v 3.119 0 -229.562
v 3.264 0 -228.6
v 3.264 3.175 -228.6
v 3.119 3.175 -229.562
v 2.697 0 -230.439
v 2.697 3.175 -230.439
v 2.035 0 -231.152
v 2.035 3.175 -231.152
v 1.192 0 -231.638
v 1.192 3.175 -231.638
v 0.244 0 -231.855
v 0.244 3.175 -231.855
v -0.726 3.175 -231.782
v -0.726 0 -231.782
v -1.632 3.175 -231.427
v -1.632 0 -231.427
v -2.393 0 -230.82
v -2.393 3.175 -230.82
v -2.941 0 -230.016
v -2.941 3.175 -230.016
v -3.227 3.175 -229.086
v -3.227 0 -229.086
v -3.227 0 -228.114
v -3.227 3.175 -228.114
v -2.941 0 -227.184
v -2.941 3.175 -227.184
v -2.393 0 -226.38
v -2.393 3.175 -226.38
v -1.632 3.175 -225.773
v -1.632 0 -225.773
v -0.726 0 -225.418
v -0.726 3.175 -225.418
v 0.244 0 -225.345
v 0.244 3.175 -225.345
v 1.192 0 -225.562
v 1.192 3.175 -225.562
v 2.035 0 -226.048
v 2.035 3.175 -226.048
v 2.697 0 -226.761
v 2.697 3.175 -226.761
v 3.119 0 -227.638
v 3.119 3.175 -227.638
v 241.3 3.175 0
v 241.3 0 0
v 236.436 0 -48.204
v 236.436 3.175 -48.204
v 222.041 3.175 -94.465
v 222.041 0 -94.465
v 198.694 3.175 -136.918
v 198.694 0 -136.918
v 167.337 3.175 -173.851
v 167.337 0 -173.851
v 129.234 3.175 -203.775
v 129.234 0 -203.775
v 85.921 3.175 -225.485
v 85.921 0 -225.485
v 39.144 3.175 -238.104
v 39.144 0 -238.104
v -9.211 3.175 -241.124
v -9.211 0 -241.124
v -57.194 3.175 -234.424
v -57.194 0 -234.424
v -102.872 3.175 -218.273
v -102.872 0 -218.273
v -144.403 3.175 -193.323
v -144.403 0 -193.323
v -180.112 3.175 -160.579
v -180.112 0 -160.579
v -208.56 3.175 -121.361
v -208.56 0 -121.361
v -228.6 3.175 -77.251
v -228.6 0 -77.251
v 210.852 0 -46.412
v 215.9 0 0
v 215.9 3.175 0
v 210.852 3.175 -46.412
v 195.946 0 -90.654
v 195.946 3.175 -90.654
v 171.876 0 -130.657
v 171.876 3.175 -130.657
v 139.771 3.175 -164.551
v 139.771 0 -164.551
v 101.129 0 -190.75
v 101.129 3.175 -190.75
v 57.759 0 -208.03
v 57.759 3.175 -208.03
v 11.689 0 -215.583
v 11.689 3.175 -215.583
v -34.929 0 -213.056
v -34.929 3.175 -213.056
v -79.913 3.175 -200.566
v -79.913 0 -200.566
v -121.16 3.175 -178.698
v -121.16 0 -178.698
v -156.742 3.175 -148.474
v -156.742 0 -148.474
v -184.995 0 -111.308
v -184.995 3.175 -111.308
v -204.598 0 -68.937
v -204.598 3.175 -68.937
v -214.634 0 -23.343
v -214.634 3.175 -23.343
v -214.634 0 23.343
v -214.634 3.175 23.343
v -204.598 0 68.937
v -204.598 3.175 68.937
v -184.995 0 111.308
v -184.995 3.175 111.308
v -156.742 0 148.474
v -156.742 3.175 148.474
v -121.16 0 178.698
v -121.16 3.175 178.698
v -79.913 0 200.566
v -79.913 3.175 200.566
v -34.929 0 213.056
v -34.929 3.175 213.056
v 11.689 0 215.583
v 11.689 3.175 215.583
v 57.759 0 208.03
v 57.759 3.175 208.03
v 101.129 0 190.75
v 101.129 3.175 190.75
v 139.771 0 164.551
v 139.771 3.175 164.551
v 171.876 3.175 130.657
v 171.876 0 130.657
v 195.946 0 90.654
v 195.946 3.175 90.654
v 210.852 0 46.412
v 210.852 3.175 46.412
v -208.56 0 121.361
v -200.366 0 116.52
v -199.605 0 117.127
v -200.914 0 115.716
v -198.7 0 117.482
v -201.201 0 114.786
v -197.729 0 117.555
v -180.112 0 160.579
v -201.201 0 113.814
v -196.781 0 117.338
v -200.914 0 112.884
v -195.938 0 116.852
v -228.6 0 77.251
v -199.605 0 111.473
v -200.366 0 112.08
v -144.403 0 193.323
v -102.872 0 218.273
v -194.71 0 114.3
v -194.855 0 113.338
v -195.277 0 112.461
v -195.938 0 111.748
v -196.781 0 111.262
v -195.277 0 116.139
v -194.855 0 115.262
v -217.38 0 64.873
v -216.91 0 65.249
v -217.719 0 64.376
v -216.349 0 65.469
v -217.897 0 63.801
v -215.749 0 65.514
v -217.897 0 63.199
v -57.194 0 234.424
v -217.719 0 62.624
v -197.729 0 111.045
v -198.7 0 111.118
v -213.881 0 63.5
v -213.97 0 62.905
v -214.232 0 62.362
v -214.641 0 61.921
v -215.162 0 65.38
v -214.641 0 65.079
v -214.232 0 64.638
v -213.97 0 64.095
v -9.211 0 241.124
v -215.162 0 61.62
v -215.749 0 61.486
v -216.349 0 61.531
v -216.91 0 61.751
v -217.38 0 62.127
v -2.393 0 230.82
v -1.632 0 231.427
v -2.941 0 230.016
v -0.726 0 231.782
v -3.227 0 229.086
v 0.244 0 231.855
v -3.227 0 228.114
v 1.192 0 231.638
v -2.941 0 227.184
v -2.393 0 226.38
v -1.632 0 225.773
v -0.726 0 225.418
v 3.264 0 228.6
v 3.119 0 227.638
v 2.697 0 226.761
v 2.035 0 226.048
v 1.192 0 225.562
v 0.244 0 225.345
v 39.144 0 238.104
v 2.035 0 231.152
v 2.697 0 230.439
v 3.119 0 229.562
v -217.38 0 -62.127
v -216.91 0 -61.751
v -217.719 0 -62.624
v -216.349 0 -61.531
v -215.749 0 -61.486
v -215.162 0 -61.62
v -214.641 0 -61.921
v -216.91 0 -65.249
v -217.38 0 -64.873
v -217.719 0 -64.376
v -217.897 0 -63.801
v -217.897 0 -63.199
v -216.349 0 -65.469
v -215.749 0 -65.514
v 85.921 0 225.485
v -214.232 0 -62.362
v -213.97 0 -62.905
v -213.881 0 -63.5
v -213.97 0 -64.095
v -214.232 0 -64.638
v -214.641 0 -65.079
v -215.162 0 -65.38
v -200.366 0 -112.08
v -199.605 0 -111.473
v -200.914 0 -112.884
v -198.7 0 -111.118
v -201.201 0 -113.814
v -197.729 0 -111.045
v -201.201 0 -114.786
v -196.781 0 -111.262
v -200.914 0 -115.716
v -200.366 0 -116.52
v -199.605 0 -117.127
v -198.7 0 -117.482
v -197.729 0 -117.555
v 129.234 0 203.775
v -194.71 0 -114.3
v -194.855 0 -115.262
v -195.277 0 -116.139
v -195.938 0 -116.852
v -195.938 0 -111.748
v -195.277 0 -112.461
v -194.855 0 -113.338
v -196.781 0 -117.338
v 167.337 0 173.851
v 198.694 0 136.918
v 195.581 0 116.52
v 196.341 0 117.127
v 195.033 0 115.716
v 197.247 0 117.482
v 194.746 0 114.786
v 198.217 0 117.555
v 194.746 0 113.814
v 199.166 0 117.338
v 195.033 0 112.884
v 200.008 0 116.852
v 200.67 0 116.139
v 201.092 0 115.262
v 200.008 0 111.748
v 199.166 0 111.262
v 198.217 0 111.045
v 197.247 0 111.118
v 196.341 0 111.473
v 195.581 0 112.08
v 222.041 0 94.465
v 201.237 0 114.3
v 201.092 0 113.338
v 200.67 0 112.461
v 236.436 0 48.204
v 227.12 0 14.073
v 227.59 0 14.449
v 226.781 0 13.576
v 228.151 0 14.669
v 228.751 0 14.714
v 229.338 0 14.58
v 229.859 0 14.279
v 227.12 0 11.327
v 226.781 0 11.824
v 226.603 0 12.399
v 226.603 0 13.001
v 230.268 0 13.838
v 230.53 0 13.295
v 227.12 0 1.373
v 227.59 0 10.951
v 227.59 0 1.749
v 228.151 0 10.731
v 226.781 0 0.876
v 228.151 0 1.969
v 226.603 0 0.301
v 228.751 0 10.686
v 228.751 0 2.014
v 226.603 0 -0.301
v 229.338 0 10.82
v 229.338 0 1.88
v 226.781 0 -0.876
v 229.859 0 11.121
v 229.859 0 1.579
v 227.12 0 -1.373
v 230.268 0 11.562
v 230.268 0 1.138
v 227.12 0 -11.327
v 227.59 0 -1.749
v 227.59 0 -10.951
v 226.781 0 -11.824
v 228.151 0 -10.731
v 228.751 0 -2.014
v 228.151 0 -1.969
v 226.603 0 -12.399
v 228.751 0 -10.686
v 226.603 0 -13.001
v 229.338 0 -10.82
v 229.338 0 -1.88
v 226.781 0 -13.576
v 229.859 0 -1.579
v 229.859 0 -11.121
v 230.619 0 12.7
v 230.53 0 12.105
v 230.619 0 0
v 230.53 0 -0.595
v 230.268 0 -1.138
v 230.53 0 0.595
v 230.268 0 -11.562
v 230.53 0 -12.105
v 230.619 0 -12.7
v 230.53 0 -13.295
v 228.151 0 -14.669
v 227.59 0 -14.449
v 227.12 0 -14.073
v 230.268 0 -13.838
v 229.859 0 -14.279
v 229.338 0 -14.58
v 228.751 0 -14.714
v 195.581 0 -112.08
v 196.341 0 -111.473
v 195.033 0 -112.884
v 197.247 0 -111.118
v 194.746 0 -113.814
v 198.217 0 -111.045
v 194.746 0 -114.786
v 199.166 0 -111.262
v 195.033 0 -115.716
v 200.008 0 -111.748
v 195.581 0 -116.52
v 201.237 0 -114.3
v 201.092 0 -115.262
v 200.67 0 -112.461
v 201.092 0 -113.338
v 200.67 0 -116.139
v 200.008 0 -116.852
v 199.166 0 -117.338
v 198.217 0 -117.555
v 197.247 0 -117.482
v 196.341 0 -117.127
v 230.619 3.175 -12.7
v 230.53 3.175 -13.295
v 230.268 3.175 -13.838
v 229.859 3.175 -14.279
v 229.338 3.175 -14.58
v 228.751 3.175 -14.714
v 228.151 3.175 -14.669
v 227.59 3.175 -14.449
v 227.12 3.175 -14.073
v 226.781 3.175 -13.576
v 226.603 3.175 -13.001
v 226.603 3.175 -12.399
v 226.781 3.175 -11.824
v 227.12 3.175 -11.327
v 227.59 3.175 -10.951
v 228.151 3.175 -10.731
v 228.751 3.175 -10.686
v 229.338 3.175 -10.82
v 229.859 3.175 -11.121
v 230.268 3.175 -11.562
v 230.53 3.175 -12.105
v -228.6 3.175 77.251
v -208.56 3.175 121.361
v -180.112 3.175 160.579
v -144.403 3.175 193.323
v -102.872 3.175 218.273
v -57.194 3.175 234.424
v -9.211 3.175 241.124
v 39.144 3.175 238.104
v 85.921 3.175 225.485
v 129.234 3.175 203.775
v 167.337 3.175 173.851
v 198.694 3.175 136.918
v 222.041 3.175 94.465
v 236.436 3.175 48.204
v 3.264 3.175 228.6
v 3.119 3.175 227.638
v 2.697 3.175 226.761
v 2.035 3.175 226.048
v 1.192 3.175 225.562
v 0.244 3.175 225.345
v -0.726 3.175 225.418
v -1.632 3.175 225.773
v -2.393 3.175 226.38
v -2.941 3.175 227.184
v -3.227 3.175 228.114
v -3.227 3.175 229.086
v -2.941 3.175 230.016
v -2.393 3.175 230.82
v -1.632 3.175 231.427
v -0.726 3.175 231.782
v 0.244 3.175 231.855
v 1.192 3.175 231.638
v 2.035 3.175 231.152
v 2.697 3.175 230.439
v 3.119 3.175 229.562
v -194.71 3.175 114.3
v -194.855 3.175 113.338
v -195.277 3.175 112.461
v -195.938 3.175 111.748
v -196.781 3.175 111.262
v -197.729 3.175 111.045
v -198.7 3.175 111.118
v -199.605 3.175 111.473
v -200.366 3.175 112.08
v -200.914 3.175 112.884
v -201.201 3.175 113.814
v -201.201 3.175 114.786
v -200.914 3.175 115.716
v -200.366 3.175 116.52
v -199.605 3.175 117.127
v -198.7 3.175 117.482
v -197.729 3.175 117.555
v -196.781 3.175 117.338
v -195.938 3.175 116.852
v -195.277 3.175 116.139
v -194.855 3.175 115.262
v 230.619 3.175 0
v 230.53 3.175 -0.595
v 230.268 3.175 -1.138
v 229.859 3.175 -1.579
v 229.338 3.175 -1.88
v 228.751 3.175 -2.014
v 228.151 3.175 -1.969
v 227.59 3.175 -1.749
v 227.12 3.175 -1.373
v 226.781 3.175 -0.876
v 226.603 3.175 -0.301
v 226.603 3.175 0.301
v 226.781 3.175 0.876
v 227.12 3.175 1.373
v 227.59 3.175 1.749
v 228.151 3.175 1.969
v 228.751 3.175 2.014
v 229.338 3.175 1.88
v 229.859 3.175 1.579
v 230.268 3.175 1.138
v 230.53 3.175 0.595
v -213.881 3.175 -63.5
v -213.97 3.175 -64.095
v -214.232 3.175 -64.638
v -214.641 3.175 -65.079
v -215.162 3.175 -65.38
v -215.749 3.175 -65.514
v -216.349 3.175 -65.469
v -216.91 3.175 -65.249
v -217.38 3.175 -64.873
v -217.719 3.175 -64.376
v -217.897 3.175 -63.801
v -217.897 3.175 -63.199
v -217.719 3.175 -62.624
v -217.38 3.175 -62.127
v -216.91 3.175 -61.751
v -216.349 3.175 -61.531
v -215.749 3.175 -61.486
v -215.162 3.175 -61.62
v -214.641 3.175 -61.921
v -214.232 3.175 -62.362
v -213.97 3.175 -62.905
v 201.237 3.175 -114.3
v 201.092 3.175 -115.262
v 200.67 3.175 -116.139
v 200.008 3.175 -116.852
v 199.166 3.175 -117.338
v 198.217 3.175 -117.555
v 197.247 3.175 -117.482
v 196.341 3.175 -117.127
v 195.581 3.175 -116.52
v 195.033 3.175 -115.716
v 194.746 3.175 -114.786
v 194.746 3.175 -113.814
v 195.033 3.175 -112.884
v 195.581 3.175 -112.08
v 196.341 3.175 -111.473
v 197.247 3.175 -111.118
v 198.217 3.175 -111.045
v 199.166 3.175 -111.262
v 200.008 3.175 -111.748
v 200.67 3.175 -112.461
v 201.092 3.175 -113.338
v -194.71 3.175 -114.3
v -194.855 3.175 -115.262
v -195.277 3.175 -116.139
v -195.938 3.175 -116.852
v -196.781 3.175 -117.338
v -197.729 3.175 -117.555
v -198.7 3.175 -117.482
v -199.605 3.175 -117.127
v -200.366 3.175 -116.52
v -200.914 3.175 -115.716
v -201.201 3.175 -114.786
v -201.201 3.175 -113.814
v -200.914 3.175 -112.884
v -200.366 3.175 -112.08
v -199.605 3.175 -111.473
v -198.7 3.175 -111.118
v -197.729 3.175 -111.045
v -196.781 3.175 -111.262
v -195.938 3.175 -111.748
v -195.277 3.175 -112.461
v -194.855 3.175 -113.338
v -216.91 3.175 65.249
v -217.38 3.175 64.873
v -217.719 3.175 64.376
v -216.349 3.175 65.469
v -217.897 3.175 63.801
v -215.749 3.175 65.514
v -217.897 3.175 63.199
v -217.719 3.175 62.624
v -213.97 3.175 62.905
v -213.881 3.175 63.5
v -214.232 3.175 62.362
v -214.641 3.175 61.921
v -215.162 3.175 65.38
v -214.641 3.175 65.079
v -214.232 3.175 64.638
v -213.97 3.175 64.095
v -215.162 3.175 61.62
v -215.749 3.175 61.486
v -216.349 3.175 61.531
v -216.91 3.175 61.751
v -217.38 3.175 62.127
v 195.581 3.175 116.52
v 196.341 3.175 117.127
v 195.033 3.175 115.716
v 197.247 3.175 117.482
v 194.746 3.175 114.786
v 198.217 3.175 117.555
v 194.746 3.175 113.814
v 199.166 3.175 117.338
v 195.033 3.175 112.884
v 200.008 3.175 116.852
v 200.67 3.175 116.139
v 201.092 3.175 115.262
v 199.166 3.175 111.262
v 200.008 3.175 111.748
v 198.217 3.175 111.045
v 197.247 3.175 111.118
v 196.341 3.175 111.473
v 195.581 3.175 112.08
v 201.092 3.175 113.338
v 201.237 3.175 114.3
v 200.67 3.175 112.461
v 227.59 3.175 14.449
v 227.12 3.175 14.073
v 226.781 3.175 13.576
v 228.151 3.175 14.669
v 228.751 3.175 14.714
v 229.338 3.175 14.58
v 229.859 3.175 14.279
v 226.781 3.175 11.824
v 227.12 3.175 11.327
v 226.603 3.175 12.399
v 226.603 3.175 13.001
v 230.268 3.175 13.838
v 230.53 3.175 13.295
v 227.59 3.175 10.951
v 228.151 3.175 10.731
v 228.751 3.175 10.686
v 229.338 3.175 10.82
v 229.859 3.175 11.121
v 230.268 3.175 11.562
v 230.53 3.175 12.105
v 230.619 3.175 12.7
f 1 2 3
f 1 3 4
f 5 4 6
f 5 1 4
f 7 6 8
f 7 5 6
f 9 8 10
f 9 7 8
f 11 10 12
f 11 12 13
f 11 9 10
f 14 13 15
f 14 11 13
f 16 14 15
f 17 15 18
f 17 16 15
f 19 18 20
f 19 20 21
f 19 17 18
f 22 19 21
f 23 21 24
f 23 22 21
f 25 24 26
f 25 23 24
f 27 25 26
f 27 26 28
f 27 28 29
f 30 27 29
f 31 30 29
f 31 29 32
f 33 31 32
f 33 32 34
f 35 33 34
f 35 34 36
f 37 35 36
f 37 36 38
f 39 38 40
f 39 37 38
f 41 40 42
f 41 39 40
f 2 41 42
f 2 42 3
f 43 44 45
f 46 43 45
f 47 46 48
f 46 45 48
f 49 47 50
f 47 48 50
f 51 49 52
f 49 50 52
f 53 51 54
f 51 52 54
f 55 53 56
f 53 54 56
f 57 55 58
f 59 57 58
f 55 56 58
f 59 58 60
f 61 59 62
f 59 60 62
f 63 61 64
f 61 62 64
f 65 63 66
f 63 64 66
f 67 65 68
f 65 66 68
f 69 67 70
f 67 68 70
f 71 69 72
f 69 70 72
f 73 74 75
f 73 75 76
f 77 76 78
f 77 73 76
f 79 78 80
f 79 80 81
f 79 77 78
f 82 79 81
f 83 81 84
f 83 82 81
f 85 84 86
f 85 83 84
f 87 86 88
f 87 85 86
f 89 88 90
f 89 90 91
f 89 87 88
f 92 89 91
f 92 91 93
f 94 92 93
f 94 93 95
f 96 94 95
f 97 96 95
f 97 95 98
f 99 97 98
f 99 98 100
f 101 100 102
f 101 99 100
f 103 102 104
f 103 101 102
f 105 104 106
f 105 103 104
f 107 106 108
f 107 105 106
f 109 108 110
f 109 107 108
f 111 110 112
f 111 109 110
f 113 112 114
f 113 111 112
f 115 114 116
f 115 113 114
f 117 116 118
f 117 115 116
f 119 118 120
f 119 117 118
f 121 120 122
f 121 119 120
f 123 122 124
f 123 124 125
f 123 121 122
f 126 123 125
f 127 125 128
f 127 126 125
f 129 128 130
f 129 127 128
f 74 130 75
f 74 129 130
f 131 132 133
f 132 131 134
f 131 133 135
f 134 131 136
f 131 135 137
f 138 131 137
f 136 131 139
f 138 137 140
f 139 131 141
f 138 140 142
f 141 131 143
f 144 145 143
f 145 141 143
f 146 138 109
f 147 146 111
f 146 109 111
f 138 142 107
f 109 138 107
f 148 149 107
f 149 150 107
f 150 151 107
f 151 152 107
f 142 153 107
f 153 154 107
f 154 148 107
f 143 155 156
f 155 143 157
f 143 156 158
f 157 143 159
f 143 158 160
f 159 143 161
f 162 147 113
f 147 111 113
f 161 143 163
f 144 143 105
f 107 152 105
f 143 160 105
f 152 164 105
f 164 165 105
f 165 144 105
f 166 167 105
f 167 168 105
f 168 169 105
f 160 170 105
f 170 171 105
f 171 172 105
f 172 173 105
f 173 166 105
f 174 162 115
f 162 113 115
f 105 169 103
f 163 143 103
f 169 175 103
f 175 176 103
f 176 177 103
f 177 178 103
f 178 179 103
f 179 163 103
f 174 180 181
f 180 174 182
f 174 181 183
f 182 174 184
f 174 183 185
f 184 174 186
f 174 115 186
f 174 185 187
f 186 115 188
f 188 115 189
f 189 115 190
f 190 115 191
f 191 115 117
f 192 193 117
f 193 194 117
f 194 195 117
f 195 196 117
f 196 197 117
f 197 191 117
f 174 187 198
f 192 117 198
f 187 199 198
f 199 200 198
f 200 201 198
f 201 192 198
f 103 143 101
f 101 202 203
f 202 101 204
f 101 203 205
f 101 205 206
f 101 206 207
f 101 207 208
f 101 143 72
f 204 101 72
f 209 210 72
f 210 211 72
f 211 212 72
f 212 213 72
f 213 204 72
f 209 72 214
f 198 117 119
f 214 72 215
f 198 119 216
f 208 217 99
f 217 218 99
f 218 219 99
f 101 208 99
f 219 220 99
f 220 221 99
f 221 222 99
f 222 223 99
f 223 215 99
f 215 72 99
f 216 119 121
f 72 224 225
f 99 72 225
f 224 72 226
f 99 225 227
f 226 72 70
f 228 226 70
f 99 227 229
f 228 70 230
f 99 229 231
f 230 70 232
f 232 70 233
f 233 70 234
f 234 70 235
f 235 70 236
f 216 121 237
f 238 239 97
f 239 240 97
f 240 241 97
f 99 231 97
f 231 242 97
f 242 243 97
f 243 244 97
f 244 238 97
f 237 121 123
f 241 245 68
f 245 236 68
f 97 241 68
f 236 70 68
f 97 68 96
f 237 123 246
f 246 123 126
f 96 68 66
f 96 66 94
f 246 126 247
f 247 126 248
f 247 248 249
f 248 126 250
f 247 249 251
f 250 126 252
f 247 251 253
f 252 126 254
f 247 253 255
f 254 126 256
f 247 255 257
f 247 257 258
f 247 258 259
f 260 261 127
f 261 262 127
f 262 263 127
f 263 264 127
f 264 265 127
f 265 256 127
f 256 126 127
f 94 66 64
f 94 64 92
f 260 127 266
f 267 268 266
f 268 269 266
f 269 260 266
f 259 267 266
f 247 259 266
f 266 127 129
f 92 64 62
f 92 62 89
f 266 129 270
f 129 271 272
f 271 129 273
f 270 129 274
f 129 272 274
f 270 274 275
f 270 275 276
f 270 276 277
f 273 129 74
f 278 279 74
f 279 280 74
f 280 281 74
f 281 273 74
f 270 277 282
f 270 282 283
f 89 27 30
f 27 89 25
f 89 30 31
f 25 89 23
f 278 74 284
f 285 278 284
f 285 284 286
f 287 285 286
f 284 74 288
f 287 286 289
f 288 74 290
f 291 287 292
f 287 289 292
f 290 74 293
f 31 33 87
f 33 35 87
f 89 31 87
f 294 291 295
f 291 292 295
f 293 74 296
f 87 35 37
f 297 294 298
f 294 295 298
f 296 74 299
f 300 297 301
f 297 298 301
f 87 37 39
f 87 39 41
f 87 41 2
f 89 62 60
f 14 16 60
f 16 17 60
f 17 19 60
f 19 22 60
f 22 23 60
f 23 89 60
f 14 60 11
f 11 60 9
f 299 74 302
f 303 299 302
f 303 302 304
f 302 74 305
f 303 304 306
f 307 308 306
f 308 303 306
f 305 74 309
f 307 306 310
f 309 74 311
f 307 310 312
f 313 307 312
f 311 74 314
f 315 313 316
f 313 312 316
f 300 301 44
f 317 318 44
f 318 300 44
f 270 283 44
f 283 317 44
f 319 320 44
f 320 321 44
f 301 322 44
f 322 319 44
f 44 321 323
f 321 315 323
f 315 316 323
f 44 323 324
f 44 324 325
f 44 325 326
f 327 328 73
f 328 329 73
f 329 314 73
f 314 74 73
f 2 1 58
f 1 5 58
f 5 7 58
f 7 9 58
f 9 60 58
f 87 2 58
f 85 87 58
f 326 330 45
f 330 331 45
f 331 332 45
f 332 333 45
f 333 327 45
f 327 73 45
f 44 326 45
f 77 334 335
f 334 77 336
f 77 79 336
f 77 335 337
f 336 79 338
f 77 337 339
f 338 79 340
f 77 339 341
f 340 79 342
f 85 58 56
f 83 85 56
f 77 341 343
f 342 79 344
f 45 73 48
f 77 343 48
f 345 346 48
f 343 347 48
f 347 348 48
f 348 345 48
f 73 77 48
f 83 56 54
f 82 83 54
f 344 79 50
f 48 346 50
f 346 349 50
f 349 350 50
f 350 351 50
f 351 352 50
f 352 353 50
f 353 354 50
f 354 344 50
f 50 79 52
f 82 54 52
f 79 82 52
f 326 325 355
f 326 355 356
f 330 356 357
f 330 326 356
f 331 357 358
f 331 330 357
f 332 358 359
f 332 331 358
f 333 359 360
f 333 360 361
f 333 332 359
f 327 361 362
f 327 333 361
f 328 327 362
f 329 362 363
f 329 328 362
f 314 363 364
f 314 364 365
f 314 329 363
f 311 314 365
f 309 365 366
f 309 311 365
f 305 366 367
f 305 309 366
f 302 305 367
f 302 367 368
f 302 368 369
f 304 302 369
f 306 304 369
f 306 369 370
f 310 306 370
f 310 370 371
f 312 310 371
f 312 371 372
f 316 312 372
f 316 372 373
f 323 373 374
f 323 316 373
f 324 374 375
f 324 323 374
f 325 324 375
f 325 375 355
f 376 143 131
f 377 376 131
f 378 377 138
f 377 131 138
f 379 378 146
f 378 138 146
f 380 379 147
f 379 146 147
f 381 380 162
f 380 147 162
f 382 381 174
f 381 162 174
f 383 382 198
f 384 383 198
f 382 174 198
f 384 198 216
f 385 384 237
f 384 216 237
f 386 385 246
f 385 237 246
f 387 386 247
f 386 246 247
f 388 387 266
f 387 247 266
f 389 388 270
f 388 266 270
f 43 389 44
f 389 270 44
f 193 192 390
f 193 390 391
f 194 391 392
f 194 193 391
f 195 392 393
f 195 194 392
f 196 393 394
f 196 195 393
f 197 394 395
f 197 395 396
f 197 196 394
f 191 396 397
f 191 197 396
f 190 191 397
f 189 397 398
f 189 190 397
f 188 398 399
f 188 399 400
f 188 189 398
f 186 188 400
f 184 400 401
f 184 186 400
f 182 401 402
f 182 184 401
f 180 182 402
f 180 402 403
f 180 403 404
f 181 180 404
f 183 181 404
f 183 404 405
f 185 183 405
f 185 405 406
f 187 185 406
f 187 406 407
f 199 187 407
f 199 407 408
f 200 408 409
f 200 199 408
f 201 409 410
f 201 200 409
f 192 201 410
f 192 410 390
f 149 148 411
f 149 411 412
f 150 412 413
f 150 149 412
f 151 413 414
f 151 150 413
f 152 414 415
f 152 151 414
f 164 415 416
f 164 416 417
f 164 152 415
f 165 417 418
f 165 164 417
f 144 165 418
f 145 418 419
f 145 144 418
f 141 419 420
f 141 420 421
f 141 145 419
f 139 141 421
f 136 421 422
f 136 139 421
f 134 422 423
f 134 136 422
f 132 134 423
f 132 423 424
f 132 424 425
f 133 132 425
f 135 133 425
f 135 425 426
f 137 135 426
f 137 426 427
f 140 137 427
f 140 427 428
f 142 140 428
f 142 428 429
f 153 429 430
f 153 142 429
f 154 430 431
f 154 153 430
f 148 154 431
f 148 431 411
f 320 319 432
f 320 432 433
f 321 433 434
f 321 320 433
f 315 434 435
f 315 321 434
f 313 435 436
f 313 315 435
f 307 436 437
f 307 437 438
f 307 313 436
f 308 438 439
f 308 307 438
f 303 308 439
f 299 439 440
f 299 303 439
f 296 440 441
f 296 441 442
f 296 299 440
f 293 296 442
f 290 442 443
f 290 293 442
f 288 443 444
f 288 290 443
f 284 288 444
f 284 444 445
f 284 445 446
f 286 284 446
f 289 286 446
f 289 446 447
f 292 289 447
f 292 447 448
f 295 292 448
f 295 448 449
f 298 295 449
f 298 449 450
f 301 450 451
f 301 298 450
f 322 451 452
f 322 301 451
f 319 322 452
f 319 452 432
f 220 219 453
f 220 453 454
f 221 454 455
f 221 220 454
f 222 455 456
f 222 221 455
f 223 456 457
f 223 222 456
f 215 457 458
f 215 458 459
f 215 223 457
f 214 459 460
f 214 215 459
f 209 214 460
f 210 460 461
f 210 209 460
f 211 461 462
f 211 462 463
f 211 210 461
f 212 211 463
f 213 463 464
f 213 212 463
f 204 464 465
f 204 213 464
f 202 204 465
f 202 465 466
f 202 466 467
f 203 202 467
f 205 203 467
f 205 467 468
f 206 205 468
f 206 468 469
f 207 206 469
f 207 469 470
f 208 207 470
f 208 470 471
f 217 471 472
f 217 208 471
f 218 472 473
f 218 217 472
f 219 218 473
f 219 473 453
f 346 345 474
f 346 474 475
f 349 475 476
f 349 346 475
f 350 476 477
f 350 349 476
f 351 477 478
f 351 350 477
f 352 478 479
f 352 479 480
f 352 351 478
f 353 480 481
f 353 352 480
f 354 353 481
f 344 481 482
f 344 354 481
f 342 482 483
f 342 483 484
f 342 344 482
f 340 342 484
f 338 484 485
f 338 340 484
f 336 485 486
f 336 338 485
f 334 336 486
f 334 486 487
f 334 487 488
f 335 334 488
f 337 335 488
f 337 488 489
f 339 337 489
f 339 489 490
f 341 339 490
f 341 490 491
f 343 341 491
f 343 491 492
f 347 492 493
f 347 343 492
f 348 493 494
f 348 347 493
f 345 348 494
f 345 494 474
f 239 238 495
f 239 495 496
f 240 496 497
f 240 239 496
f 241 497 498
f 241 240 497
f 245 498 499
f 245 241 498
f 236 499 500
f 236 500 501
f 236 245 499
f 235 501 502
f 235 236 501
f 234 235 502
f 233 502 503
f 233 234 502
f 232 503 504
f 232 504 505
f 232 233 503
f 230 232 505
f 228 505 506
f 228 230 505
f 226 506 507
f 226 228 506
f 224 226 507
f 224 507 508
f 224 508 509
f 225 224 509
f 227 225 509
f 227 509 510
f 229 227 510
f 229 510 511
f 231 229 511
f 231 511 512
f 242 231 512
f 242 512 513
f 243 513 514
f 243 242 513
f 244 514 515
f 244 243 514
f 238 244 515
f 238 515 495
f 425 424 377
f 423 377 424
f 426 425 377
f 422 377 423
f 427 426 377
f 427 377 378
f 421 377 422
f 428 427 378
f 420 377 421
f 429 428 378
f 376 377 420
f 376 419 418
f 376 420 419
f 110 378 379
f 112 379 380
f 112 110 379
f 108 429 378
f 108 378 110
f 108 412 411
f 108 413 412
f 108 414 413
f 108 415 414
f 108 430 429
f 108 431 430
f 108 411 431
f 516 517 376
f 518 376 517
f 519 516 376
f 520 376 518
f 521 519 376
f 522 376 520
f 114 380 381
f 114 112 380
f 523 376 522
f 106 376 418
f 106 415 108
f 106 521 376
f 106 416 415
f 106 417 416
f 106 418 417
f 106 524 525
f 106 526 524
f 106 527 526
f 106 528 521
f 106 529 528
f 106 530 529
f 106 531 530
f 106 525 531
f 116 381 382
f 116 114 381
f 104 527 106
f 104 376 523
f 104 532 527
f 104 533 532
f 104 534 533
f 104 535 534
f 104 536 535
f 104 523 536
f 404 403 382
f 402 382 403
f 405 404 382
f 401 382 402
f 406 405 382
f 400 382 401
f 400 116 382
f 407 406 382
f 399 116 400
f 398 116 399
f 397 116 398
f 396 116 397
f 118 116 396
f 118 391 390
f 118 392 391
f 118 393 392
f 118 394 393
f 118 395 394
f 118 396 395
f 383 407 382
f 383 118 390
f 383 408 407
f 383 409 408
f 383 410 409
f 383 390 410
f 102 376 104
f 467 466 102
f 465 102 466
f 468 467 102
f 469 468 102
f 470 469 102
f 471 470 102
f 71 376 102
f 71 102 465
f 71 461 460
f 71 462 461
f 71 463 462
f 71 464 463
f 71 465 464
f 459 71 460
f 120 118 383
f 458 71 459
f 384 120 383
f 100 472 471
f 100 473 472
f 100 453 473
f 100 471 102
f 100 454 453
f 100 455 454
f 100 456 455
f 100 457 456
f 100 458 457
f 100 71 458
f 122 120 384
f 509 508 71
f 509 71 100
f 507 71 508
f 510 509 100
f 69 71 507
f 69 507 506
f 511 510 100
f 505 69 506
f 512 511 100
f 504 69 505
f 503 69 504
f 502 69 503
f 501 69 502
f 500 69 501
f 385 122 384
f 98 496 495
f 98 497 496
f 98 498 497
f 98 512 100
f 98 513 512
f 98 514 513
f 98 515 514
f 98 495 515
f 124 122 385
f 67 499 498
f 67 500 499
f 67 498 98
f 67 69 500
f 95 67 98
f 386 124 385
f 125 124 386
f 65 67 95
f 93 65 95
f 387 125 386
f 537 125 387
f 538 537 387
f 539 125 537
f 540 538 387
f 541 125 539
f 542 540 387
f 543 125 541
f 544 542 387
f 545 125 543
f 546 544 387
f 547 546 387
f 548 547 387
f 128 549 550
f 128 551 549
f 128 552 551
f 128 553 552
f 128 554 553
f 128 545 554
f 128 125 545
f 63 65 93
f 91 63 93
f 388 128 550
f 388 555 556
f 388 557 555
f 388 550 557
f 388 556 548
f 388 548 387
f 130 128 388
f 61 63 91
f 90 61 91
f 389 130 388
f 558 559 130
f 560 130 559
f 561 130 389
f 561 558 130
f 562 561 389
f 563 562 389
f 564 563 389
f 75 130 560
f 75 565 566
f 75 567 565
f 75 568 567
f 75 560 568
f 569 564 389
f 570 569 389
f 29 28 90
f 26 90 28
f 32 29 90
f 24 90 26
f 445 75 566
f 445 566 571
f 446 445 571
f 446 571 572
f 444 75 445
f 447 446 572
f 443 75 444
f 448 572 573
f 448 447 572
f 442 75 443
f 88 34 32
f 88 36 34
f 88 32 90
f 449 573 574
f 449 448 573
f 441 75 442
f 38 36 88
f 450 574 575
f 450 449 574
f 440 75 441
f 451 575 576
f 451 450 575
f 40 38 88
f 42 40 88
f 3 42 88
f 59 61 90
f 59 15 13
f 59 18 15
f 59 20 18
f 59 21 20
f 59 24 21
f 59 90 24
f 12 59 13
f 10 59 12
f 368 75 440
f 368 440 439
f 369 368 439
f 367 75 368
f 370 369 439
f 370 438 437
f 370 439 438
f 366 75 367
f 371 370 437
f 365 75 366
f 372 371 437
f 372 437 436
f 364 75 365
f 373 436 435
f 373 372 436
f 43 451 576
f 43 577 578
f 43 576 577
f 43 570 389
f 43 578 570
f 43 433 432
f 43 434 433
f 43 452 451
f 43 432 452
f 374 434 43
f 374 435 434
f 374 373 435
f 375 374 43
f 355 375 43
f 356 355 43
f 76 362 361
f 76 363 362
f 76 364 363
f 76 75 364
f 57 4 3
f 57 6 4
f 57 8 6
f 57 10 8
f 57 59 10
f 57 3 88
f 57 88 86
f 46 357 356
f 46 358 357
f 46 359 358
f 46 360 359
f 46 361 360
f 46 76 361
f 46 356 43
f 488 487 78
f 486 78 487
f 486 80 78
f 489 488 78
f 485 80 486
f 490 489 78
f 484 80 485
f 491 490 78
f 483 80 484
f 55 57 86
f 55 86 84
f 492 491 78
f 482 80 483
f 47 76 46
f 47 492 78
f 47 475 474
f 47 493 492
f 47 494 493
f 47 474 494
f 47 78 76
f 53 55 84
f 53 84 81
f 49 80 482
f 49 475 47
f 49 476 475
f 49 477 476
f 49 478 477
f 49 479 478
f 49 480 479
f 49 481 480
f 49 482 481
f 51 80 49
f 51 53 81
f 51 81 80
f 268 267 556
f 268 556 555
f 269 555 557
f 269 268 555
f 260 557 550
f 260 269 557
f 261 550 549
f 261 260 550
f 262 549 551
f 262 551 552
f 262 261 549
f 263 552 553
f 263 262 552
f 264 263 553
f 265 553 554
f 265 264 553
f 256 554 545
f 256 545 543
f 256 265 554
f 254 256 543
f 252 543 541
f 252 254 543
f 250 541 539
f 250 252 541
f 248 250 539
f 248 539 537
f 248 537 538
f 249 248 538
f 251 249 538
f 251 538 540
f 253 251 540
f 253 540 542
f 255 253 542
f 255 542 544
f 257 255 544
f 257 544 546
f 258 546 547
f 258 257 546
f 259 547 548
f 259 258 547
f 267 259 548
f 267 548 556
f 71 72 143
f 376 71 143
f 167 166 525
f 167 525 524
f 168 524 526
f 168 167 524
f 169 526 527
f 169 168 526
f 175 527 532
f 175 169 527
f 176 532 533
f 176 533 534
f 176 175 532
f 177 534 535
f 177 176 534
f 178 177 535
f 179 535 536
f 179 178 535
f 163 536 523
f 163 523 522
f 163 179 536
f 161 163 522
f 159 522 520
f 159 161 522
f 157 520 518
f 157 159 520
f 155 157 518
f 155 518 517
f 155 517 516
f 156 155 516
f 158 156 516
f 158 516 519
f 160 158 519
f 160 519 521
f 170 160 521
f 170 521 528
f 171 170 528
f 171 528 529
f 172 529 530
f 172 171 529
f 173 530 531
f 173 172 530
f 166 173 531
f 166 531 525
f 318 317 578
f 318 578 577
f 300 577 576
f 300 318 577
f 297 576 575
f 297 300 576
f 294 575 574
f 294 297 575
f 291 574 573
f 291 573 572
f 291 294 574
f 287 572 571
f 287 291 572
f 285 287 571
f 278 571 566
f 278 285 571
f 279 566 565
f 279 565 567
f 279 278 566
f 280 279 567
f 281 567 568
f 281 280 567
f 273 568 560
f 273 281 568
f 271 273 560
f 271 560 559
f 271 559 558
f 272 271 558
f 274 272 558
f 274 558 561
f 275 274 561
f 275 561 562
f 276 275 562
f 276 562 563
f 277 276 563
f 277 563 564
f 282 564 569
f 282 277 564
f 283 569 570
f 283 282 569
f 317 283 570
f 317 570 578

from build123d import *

# Parameters (mm, degrees)
SKETCH1_R           = 3.2639
SKETCH1_R_2         = 2.0193
SKETCH1_R_3         = 215.9
BOSS_EXTRUDE1_DEPTH = 3.175


with BuildPart() as part:
    # Sketch1 → Boss-Extrude1 (new body)
    with BuildSketch(Plane(origin=(0, 0, 0), x_dir=(1, 0, 0), z_dir=(0, 1, 0))):
        with BuildLine():
            ThreePointArc((241.3, 0), (39.144028917, 238.103832393), (-228.600000001, 77.251084131))
            Line((-228.6, 77.251084131), (-228.6, -77.251084131))
            ThreePointArc((-228.600000001, -77.251084131), (39.144028917, -238.103832393), (241.3, 0))
        make_face()
        with Locations((0, -228.6)):
            Circle(SKETCH1_R, mode=Mode.SUBTRACT)
        with Locations((-197.973407305, -114.3)):
            Circle(SKETCH1_R, mode=Mode.SUBTRACT)
        with Locations((-215.9, -63.5)):
            Circle(SKETCH1_R_2, mode=Mode.SUBTRACT)
        with Locations((197.973407305, -114.3)):
            Circle(SKETCH1_R, mode=Mode.SUBTRACT)
        with Locations((228.6, -12.7)):
            Circle(SKETCH1_R_2, mode=Mode.SUBTRACT)
        with Locations((-215.9, 63.5)):
            Circle(SKETCH1_R_2, mode=Mode.SUBTRACT)
        with Locations((-197.973407305, 114.3)):
            Circle(SKETCH1_R, mode=Mode.SUBTRACT)
        Circle(SKETCH1_R_3, mode=Mode.SUBTRACT)
        with Locations((0, 228.6)):
            Circle(SKETCH1_R, mode=Mode.SUBTRACT)
        with Locations((197.973407305, 114.3)):
            Circle(SKETCH1_R, mode=Mode.SUBTRACT)
        with Locations((228.6, 0)):
            Circle(SKETCH1_R_2, mode=Mode.SUBTRACT)
        with Locations((228.6, 12.7)):
            Circle(SKETCH1_R_2, mode=Mode.SUBTRACT)
    extrude(amount=BOSS_EXTRUDE1_DEPTH)


solid = part.part
